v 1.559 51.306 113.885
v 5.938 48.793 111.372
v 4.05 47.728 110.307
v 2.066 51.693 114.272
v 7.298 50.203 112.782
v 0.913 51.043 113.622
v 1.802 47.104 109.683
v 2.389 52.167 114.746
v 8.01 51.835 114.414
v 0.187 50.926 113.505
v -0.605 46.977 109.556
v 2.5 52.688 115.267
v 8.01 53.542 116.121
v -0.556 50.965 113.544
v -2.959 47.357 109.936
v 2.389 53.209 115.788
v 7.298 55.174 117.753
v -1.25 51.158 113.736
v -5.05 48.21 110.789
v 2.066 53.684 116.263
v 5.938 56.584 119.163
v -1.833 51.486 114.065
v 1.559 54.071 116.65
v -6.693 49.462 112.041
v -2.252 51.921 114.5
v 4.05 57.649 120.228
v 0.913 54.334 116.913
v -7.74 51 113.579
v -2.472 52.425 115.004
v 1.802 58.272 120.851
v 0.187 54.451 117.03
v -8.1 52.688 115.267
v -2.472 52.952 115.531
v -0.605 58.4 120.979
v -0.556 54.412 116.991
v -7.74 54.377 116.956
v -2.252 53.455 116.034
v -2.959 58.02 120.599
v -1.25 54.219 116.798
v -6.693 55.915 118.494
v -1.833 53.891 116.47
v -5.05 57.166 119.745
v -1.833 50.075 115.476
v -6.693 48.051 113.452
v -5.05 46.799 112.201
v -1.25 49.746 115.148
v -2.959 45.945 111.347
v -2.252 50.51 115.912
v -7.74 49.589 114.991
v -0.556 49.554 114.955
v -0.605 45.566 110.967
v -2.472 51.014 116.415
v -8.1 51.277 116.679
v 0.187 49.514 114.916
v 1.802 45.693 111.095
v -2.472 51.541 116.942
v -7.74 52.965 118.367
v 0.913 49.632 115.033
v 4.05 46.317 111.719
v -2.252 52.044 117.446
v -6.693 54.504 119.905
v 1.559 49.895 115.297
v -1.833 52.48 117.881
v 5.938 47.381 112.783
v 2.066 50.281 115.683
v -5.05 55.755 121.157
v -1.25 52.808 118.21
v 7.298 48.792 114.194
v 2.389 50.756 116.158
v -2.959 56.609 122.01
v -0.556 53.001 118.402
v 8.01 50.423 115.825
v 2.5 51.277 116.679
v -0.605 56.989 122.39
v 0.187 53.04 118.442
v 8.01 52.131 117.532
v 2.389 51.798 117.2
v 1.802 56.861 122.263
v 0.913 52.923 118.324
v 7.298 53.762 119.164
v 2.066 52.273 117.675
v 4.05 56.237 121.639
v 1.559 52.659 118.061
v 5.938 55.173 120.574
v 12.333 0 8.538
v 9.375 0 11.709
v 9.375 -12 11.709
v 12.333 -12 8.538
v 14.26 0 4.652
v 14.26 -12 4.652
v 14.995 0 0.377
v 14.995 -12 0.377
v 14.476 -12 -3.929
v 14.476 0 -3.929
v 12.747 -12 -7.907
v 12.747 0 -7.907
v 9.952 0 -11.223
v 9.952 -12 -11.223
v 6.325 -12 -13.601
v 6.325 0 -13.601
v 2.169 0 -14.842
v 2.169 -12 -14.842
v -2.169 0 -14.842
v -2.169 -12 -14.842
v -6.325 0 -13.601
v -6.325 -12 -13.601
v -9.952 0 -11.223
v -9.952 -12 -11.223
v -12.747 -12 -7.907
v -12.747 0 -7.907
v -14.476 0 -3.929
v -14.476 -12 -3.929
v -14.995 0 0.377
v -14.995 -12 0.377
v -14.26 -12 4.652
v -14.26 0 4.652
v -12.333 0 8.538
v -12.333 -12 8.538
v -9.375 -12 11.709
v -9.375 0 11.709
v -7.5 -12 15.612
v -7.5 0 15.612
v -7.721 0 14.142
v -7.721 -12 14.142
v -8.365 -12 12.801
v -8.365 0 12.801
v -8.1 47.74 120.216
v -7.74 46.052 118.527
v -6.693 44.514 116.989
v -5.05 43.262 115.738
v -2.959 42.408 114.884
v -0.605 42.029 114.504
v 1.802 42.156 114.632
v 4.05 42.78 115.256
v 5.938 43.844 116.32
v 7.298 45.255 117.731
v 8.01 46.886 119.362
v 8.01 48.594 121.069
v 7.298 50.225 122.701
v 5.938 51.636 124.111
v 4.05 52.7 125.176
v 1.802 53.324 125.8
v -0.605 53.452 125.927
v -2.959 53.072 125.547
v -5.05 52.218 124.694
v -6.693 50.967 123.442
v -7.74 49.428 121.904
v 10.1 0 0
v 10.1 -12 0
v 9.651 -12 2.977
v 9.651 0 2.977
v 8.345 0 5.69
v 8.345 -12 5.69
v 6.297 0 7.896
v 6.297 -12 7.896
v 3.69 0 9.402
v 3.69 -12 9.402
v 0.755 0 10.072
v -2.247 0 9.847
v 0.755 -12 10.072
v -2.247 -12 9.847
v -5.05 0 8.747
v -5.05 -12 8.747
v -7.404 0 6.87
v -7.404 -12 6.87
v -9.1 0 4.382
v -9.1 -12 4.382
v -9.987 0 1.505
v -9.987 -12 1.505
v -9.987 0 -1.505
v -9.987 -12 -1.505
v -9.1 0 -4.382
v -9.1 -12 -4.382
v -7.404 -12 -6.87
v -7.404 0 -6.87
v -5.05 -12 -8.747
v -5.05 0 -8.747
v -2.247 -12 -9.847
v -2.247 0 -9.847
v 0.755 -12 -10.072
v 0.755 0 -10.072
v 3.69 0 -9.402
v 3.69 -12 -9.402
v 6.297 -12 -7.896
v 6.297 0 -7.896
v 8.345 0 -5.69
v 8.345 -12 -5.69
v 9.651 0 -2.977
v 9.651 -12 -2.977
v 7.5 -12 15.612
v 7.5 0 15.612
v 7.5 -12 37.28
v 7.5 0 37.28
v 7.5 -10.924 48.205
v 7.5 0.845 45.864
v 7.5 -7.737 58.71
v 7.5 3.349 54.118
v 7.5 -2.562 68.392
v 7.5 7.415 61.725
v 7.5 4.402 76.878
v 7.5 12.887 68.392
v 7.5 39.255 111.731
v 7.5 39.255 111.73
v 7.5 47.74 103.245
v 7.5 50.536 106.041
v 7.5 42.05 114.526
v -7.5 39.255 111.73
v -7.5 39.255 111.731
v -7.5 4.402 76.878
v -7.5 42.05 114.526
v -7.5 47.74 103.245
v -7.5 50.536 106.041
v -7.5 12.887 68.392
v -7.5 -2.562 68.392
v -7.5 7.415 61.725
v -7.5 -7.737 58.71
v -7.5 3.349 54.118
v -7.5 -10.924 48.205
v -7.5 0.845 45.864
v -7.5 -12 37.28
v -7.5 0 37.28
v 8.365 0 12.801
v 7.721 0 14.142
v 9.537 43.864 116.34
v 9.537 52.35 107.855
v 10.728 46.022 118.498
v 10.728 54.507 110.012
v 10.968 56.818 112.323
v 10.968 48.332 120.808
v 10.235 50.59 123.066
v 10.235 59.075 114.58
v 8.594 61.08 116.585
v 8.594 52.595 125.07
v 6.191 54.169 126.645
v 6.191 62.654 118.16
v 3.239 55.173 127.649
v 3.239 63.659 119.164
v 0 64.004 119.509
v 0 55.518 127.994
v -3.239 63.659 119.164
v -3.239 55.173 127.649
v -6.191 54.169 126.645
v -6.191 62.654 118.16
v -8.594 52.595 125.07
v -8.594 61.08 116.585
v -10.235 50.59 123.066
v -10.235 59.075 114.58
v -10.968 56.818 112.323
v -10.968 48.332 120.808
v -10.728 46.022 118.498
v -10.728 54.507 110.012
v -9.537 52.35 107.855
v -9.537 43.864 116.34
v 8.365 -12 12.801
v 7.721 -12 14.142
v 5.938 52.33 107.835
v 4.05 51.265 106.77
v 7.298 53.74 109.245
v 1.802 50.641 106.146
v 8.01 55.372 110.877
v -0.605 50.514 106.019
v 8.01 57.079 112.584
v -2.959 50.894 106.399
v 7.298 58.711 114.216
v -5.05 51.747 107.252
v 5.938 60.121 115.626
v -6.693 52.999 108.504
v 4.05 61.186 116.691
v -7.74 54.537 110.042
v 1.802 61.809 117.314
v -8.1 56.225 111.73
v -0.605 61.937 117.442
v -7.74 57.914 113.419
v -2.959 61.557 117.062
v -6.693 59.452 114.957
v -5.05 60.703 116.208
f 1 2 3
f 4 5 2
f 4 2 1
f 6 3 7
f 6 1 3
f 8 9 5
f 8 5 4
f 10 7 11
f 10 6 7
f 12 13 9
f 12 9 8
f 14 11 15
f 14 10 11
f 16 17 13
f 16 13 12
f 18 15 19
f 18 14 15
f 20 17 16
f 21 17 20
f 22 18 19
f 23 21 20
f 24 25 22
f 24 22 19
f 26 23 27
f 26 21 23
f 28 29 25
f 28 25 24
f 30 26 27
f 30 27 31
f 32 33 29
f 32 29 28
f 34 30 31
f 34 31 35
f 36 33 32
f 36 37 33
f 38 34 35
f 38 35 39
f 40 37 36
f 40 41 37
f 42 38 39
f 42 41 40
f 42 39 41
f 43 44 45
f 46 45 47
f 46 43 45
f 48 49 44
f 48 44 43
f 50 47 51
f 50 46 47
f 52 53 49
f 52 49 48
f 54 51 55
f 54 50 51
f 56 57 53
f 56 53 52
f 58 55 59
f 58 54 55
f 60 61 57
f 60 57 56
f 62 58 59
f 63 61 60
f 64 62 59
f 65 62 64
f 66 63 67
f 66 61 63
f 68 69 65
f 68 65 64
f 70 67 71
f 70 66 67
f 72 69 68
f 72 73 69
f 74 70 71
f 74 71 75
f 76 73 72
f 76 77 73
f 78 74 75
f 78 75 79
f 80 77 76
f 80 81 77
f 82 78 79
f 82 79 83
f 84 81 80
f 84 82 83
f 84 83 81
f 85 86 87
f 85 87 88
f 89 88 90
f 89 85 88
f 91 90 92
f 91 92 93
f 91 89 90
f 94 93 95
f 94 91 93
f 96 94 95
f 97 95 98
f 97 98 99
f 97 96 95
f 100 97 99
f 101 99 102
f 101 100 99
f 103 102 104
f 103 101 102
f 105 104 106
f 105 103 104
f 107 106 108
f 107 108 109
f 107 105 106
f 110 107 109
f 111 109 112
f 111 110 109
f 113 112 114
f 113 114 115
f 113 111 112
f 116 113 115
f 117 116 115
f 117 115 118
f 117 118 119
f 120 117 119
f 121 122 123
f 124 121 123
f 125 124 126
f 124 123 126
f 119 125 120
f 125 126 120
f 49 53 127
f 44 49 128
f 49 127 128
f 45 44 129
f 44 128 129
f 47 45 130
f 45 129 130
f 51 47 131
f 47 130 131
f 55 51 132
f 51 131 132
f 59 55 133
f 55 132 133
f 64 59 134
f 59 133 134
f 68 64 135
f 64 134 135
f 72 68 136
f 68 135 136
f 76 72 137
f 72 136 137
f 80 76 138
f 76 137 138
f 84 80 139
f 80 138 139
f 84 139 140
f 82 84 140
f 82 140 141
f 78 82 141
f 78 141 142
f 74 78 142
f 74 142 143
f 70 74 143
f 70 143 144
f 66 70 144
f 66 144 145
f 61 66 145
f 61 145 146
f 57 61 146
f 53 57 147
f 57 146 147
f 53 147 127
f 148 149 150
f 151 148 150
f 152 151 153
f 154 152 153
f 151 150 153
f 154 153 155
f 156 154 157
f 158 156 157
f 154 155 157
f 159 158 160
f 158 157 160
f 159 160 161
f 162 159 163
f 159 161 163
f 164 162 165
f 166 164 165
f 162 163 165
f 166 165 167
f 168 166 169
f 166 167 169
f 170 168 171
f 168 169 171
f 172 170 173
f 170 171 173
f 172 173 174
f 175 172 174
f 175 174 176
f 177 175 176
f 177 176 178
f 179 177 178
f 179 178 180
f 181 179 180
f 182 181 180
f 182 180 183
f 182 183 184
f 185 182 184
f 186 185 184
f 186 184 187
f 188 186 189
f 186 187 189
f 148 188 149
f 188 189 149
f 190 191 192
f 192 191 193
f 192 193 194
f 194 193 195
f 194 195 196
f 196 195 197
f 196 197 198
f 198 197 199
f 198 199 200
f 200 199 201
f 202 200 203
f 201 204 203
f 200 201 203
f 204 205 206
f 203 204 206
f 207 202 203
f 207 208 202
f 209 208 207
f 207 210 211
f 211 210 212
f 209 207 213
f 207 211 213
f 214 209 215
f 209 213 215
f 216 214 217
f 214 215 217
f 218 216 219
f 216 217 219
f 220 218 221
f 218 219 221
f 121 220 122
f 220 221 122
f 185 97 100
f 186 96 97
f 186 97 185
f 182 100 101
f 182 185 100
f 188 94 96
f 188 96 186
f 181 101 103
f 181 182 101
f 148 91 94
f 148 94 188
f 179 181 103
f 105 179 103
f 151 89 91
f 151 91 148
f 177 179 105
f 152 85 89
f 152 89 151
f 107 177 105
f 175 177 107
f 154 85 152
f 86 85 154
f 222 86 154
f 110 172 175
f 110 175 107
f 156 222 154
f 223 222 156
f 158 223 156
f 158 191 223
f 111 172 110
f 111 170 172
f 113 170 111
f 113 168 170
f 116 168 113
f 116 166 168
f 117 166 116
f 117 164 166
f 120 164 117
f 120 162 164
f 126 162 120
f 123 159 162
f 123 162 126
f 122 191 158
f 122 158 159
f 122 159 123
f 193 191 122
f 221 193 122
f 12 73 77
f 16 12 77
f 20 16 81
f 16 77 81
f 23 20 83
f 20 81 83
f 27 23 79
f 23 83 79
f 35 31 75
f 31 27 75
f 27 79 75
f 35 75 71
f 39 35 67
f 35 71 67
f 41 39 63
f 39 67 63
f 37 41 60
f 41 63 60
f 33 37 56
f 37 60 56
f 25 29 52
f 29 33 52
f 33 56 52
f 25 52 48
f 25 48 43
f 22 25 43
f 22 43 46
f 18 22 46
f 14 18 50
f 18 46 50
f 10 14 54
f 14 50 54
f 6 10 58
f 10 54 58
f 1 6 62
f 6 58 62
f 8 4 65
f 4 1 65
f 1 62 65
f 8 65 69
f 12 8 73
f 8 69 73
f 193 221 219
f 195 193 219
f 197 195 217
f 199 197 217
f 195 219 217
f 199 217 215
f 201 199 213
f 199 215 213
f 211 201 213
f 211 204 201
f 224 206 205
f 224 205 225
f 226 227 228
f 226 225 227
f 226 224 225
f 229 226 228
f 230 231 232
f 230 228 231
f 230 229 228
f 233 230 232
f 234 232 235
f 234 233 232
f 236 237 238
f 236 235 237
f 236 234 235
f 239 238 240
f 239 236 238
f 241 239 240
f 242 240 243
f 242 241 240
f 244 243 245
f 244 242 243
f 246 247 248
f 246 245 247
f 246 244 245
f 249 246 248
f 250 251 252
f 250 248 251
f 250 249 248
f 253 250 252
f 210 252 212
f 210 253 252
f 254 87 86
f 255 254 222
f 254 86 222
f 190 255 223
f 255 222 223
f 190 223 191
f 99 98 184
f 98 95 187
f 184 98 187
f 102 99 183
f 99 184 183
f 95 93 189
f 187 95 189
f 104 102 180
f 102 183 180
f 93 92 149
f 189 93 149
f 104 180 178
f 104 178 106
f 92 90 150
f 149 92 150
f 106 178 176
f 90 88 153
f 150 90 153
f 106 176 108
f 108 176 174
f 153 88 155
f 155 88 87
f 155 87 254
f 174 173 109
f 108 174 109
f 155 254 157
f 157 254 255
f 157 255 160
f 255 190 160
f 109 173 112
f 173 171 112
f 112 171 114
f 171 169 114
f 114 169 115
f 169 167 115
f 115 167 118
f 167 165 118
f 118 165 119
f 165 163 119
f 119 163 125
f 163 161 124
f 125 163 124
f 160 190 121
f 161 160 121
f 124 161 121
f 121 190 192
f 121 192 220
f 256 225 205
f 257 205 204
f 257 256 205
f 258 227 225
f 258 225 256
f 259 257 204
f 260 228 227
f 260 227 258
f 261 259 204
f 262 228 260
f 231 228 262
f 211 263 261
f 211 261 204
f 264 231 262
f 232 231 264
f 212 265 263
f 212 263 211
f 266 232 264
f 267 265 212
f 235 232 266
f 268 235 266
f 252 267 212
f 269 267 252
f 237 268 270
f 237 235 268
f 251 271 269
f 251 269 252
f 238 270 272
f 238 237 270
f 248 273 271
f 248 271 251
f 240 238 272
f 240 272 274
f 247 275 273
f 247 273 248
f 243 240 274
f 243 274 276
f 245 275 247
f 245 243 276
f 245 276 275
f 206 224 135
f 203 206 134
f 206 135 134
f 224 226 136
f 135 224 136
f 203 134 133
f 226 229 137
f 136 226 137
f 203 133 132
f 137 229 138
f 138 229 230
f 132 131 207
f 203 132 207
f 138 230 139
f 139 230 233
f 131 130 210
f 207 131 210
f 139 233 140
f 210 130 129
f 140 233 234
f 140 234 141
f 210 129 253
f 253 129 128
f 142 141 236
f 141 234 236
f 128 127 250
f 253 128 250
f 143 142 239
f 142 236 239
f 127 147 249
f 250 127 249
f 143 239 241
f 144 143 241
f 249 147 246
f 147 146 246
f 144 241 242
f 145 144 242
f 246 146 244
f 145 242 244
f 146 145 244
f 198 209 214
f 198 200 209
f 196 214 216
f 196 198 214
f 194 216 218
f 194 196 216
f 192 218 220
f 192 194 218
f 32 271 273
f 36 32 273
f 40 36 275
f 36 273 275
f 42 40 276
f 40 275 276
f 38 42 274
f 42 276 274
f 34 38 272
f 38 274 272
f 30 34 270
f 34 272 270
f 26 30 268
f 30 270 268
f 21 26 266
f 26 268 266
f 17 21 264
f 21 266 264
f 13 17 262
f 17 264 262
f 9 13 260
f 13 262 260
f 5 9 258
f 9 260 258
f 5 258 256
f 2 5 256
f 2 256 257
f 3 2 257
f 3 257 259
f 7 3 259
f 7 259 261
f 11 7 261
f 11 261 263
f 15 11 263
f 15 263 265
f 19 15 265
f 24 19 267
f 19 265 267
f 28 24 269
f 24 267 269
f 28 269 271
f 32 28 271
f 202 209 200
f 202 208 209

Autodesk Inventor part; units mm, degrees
ref_plane "YZ Plane" through (0, 0, 0) normal (1, 0, 0) x (0, 1, 0)
ref_plane "XZ Plane" through (0, 0, 0) normal (0, 1, 0) x (-1, 0, 0)
sketch "Sketch1" plane through (0, 0, 0) normal (0, 1, 0) x (-1, 0, 0)
  arc A0 (-9.375, 11.7094) -> (9.375, 11.7094) centre (0, 0) ccw
  line L0 (-7.5, 15.6125) -> (-7.5, 22.9904)
  line L1 (7.5, 22.9904) -> (7.5, 15.6125)
  line L2 (7.5, 22.9904) -> (-7.5, 22.9904)
  arc A1 (7.5, 15.6125) -> (9.375, 11.7094) centre (12.5, 15.6125) ccw
  arc A2 (-9.375, 11.7094) -> (-7.5, 15.6125) centre (-12.5, 15.6125) ccw
  point P0 (7.5, 12.9904)
  point P1 (-7.5, 12.9904)
  point P2 (0, 12.9904)
  point P3 (0, 22.9904)
  dimension "d0" = 30
  dimension "d109" = 5
  dimension "d129" = 15
  dimension "d131" = 10
  dimension "d132" = 12.9904
extrude "Extrusion1" add sketch "Sketch1" against normal blind 12
sketch "Sketch22" plane through (-7.5, 0, 22.9904) normal (0, 0, 1) x (1, 0, 0)
  line L0 (0, 0) -> (0, -12) projected
  line L1 (15, -12) -> (0, -12) projected
  line L2 (0, 0) -> (15, 0)
  line L3 (15, 0) -> (15, -12)
  line L4 (15, -12) -> (0, -12)
  line L5 (0, -12) -> (0, 0)
  point P0 (7.5, 0)
sketch "Sketch23" plane through (0, 0, 0) normal (1, 0, 0) x (0, 1, 0)
  line L0 (0, 22.9904) -> (-12, 22.9904) projected
  line L1 (-6, 22.9904) -> (-6, 37.2797)
  line L2 (8.6447, 72.635) -> (43.4975, 107.4879)
  arc A0 (8.6447, 72.635) -> (-6, 37.2797) centre (44, 37.2797) ccw
  point P0 (0, 0)
  point P1 (-6, 57.9904)
  dimension "d110" = 35
  dimension "d111" = 70
  dimension "d112" = 135
  dimension "d113" = 50
sweep "Sweep2" add profiles "Sketch22" path "Sketch23" path curves L1 A0 L2
ref_plane "Work Plane11" through (7.5, 8.6447, 72.635) normal (0, 0.7071, -0.7071) x (-1, 0, 0)
sketch "Sketch24" plane through (7.5, 8.6447, 72.635) normal (0, 0.7071, -0.7071) x (-1, 0, 0)
  line L0 (0, 49.2893) -> (15, 49.2893)
  line L1 (0, 49.2893) -> (15, 49.2893)
  line L2 (0, 49.2893) -> (0, 53.2426)
  line L3 (15, 49.2893) -> (15, 53.2426)
  arc A0 (15, 53.2426) -> (0, 53.2426) centre (7.5, 61.2893) ccw
  line L4 (0, 49.2893) -> (15, 49.2893) projected
  point P0 (7.5, -57.4734)
  point P1 (7.5, 49.2893)
  point P2 (7.5, 49.2893)
  dimension "d136" = 22
  dimension "d137" = 12
extrude "Extrusion17" add sketch "Sketch24" along normal mid plane 12
sketch "Sketch25" plane through (-7.5, 4.402, 76.8777) normal (0, -0.7071, 0.7071) x (1, 0, 0)
  arc A0 (15, 53.2426) -> (0, 53.2426) centre (7.5, 61.2893) ccw projected
  circle A1 centre (7.5, 61.2893) radius 2.5
  point P0 (7.5, -57.4734)
  dimension "d138" = 5
extrude "Extrusion18" cut sketch "Sketch25" against normal through all
sketch "Sketch26" plane through (0, -12, 0) normal (0, -1, 0) x (1, 0, 0)
  circle A0 centre (0, 0) radius 10.1
  dimension "d133" = 20.2
extrude "Extrusion19" cut sketch "Sketch26" against normal through all
sketch "Sketch27" plane through (7.5, 12.8873, 68.3924) normal (0, 0.7071, -0.7071) x (-1, 0, 0)
  circle A0 centre (7.5, 61.2893) radius 2.5 projected
  circle A1 centre (7.5, 61.2893) radius 8.1
  point P0 (7.5, -57.4734)
  dimension "d139" = 16.2
extrude "Extrusion20" cut sketch "Sketch27" against normal blind 5
mirror "Mirror2" about plane through (7.5, 8.6447, 72.635) normal (0, 0.7071, -0.7071) of "Extrusion20"
properties part number "proximal_link_2"
